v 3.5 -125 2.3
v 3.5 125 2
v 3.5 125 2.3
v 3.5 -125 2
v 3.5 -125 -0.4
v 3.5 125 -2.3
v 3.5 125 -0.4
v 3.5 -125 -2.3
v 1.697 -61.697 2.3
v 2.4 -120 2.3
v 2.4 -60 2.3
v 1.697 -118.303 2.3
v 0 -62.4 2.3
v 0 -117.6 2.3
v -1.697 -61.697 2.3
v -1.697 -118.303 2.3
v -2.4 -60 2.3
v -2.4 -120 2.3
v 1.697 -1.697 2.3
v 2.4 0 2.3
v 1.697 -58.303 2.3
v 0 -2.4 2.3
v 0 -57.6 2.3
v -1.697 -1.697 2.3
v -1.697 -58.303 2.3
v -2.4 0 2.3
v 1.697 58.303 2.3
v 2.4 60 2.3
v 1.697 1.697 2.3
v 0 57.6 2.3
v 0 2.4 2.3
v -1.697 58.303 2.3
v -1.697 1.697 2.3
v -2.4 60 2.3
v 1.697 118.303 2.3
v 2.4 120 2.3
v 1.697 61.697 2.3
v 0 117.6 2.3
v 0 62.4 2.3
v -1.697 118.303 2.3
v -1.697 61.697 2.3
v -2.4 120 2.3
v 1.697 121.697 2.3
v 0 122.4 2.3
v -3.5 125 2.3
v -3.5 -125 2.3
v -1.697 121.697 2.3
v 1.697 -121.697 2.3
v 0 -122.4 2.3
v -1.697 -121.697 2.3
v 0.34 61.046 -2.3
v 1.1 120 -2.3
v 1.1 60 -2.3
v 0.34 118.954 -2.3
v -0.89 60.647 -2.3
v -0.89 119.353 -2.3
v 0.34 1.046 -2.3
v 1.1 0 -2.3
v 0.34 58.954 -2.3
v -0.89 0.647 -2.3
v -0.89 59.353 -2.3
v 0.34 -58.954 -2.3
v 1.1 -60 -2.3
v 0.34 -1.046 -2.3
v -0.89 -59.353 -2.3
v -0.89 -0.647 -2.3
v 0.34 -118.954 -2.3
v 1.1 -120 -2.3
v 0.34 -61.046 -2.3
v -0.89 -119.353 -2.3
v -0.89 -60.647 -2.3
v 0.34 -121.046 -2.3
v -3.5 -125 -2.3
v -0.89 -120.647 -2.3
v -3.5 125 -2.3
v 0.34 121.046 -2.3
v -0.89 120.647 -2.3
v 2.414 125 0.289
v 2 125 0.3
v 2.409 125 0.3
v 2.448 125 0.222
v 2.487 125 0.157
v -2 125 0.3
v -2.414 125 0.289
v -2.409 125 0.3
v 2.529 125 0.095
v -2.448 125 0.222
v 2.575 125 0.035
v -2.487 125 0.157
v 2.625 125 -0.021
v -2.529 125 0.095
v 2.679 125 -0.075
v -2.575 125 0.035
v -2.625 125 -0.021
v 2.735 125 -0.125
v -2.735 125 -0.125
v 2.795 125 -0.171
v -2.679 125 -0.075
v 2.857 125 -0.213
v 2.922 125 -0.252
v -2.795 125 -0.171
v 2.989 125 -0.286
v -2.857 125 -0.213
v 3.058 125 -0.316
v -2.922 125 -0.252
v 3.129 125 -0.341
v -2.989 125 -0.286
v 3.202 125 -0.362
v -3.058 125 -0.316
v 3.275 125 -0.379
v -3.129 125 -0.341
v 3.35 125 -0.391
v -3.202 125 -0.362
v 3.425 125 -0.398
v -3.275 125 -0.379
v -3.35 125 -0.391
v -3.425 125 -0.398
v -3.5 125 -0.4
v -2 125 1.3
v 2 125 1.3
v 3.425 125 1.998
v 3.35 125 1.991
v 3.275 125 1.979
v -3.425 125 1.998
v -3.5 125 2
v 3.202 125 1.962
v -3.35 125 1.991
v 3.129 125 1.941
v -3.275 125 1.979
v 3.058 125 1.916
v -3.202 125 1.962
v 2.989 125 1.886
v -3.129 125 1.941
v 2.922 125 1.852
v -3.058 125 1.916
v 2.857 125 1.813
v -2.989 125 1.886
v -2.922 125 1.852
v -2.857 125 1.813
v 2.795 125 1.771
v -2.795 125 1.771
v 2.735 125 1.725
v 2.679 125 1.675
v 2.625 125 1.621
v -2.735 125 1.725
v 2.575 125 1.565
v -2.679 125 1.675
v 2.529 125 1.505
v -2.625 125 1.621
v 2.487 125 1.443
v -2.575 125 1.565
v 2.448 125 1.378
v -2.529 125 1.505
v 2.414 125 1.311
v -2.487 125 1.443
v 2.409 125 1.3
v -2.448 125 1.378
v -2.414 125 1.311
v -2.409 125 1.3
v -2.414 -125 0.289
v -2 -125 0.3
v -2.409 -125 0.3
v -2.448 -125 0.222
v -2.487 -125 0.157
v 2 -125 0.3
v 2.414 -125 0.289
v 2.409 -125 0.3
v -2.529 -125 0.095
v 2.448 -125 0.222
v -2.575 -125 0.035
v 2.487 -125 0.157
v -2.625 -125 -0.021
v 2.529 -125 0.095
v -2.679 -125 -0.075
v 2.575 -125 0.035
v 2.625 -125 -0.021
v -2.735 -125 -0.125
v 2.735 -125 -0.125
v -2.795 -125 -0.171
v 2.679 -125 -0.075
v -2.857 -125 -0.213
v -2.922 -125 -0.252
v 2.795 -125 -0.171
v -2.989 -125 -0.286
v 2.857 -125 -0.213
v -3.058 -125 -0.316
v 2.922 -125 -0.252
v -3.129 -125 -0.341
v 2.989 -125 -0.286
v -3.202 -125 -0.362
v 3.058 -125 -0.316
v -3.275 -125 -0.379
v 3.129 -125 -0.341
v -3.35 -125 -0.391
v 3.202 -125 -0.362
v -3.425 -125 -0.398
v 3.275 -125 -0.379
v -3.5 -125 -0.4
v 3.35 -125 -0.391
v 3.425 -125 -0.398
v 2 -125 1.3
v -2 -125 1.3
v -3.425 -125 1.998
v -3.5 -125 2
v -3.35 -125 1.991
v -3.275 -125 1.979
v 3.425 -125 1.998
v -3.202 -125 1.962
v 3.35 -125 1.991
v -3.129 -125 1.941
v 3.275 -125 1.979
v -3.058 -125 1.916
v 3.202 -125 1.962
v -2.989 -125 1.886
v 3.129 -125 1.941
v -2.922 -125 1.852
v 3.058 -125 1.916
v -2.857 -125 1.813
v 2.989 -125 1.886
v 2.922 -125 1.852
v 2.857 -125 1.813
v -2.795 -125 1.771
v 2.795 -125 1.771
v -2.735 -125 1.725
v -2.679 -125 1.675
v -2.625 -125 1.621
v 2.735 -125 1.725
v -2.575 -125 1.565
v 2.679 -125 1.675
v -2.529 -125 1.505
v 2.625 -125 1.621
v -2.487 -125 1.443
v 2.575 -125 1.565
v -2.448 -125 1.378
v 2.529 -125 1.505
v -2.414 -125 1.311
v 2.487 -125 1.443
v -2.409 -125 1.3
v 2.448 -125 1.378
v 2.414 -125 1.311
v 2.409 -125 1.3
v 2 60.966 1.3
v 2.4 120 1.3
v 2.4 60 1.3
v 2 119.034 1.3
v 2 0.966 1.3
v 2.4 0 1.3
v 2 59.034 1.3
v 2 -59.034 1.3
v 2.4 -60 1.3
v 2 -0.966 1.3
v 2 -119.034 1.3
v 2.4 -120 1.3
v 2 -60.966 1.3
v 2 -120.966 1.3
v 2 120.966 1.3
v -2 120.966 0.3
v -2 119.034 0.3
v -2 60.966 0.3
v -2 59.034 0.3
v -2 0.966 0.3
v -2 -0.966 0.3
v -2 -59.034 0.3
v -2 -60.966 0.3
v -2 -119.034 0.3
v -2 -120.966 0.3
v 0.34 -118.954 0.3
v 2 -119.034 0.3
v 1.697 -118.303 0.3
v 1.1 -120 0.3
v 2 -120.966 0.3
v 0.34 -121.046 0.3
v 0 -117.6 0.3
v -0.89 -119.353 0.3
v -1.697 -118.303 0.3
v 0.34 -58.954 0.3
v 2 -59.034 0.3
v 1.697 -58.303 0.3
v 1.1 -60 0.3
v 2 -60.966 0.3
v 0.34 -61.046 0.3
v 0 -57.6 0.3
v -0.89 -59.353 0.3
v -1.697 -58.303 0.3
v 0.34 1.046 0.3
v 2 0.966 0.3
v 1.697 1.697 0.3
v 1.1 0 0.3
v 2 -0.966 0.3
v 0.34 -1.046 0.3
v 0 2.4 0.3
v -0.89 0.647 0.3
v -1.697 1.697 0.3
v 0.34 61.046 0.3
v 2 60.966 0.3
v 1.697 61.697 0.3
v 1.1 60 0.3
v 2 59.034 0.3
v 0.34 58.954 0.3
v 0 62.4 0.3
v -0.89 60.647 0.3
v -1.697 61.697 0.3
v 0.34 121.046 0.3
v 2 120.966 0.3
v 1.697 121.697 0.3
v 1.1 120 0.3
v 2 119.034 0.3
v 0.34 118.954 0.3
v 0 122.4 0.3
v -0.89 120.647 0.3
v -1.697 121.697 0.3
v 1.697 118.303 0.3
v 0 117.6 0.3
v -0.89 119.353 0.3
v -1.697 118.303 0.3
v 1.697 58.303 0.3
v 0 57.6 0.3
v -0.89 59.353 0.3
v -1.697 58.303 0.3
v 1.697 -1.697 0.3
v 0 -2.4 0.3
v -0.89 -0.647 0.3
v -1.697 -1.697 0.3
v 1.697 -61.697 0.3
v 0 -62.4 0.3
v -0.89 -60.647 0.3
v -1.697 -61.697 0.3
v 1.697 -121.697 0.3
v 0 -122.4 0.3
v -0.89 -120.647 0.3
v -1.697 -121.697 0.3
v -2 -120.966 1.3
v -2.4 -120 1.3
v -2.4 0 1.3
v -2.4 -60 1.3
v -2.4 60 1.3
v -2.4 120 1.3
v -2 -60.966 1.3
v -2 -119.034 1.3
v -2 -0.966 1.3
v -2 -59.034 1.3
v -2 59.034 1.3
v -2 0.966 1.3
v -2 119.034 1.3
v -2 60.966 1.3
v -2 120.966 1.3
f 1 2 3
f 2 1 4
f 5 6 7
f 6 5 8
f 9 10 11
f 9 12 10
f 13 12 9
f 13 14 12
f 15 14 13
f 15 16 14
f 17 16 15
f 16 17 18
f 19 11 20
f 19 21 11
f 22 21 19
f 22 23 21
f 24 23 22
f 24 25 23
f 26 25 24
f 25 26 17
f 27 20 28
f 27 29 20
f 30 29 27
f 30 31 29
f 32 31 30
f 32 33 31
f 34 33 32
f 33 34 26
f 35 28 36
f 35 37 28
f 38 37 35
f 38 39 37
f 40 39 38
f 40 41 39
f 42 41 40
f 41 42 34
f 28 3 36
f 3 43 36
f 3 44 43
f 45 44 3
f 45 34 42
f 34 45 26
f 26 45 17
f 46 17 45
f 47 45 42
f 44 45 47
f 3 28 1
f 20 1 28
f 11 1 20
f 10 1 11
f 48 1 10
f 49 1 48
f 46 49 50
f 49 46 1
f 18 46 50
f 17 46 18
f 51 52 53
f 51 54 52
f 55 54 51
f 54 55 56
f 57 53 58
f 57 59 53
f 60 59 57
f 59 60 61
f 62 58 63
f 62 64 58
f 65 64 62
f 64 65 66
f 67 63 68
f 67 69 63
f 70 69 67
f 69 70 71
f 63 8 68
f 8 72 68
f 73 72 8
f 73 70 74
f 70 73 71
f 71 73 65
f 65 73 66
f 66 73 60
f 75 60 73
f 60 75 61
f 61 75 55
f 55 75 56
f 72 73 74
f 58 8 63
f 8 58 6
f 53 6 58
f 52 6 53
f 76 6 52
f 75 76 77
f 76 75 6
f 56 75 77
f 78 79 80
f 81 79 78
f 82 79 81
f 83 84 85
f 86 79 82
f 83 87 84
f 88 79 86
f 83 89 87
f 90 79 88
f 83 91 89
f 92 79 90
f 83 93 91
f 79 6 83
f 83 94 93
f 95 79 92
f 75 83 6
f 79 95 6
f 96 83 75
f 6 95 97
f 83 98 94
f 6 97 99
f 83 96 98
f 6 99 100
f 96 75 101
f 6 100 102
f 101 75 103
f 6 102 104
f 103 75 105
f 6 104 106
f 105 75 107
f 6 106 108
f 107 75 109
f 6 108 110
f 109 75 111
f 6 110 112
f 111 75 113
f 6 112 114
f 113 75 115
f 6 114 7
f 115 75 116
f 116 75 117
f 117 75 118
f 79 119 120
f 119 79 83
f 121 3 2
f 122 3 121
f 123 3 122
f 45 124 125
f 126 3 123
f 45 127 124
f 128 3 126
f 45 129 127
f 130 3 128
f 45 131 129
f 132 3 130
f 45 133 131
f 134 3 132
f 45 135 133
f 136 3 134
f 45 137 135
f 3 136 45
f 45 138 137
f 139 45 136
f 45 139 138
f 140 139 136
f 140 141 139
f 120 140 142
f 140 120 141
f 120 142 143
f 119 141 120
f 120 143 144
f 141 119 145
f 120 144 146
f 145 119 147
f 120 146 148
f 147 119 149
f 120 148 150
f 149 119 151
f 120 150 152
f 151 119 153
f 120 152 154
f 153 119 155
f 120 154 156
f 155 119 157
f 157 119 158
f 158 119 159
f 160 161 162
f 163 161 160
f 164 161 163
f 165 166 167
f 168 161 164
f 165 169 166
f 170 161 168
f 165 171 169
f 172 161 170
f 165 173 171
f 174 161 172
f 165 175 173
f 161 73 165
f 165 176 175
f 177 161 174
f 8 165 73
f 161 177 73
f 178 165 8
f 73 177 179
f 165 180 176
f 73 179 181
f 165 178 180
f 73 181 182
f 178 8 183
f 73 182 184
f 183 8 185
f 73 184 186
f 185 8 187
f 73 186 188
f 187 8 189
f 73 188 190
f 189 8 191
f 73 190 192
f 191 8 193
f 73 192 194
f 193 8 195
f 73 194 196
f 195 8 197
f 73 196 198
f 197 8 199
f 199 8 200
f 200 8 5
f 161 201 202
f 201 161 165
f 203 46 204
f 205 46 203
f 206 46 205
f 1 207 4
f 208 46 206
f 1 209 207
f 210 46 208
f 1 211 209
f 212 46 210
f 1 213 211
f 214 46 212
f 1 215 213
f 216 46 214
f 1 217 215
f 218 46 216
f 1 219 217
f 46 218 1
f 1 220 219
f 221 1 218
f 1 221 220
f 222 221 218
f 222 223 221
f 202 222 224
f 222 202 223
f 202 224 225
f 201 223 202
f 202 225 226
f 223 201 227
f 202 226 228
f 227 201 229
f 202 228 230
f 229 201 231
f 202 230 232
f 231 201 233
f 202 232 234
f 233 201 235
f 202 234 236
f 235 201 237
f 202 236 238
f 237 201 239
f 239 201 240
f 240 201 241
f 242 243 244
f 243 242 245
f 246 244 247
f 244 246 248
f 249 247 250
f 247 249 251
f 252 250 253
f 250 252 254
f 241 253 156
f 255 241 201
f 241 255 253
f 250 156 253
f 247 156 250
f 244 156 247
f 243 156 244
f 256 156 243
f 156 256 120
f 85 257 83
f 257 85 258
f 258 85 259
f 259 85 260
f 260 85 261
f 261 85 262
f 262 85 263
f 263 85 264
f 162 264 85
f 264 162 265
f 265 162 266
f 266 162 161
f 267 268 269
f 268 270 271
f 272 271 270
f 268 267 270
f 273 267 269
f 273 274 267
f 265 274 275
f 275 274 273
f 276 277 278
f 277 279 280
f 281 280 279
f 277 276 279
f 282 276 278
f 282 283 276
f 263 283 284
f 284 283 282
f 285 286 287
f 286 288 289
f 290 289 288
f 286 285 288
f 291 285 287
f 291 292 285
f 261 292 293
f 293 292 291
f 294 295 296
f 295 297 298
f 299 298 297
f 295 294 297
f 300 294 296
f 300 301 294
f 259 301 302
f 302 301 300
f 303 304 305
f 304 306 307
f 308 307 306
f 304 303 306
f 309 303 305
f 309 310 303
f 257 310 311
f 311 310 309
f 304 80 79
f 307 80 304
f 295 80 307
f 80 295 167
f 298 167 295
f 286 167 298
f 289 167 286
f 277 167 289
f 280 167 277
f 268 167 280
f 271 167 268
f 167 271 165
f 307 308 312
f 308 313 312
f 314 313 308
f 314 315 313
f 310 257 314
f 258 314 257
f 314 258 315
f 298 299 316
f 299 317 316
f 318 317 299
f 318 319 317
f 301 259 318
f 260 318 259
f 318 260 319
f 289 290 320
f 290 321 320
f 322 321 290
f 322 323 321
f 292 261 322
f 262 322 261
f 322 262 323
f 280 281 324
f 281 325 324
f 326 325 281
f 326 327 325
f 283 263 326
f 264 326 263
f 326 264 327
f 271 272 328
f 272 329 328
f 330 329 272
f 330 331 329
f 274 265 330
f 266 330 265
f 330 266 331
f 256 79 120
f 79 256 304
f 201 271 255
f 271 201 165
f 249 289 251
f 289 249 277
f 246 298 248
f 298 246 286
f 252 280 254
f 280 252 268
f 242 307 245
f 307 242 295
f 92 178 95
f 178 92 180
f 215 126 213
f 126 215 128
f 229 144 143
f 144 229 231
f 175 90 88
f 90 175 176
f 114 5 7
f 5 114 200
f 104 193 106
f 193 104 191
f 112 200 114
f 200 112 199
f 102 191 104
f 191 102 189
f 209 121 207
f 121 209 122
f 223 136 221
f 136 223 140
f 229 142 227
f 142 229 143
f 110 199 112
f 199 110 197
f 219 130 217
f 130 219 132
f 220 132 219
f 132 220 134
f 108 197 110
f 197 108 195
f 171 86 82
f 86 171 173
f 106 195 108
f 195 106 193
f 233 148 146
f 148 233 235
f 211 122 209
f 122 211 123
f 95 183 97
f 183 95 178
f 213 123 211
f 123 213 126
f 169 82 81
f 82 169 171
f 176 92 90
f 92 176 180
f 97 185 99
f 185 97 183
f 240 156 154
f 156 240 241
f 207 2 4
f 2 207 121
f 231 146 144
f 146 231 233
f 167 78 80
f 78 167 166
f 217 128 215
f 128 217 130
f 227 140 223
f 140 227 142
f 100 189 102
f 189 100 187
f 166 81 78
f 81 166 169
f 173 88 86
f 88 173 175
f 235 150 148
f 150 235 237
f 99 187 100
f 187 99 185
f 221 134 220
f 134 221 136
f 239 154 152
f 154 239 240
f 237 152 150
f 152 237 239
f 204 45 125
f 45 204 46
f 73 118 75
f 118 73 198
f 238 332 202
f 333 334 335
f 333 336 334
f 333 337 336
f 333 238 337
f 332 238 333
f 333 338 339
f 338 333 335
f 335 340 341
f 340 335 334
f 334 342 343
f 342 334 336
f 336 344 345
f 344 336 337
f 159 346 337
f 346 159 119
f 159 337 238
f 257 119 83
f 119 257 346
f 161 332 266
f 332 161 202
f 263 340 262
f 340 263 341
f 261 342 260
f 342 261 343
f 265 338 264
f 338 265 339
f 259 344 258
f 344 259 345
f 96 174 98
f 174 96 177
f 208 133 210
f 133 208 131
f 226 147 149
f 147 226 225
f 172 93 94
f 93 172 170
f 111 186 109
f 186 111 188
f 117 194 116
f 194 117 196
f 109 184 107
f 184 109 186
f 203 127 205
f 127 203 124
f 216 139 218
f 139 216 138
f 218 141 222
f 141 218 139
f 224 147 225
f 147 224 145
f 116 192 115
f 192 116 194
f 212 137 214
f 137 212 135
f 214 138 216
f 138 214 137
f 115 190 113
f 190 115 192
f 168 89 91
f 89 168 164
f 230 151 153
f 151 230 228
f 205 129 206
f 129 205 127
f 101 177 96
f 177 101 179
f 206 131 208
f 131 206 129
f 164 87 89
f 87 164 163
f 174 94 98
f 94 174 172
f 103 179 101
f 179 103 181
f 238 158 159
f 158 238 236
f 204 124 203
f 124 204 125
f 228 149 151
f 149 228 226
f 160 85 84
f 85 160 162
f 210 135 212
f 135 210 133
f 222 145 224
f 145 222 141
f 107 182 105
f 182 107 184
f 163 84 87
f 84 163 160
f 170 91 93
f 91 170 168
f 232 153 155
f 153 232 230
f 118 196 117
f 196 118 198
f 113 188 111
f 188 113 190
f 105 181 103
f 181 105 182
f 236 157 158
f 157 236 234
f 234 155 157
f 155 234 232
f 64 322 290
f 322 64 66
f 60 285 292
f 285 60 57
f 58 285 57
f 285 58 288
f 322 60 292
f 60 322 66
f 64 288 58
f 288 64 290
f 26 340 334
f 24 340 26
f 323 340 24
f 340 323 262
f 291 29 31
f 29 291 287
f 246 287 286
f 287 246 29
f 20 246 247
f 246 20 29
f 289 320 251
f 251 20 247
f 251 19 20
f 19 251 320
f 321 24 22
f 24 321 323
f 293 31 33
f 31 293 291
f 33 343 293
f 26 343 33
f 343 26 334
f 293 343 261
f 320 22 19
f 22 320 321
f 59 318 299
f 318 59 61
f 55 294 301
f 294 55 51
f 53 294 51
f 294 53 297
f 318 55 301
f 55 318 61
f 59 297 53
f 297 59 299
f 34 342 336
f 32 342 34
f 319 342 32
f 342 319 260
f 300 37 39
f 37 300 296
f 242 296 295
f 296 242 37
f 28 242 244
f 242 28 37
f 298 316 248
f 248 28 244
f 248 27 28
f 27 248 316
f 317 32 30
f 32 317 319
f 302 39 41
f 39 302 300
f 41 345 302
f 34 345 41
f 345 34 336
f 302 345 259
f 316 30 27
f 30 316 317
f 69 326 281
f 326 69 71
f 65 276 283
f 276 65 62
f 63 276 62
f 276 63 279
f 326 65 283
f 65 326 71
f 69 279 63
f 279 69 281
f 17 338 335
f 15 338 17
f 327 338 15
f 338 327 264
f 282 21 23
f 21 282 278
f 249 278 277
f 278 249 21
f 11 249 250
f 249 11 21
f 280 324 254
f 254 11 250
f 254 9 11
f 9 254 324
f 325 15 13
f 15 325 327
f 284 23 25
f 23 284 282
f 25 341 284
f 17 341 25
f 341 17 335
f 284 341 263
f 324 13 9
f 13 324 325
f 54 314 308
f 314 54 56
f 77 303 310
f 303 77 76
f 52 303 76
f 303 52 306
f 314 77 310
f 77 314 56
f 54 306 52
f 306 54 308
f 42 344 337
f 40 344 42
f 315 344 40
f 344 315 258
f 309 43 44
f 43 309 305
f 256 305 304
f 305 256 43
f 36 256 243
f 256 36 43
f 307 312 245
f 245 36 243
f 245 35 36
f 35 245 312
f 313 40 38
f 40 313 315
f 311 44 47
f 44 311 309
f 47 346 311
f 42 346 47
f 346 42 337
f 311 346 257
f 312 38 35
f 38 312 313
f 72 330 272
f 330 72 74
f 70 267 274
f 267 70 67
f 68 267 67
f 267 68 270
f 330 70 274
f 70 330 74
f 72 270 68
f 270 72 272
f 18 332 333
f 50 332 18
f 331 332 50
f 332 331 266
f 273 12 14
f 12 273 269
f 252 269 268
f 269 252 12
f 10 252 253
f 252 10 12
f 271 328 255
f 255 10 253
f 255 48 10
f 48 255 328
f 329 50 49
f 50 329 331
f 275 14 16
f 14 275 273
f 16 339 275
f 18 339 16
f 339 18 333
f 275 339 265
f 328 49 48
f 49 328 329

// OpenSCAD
/*
Common Guide Measurements, rrecently learnt about the scope variable, sad face.

All measurements in metric millimetres
*/

//If anyone knows of a guide to standardisation among sizings of linear guides and there carriages let me know so I can make this more accurate and add more options, would like to have the carriage generation as well eventually.

//Default Style (For custom measurements choose custom)
//type = "MGN7"; // [MGN12, MGN7, custom]


//Linear Rail Length
guideLength = 250;

//Guide Height
guideWidth = 7;

//Guide Height
guideHeight = 4.6;

//Ball Guide distance from top of the carriage
ballGuideTopDistance = 1.5;

//(spacing between holes not pitch)
holePitch = 60;

//Inner Hole Radius 
innerHoleDiameter = 1.1;

//Outer Hole Radius
outerHoleDiameter = 2.4;

//Depth of the top outer hole to the inner.
outerHoleDepth = 2;
 

module guideRail(){
    //Draw profile cube of width, length and height, cut cylinder and cube out for rollers then mirror on the x-axis.
        difference(){
            difference (){
                translate([guideWidth/4,0,0])
                cube([guideWidth/2, guideLength, guideHeight], true);
                    translate([guideWidth/2-1,0,guideHeight/2-ballGuideTopDistance])    cube([1,guideLength+1,1], true);
            };
            rotate(a = 90, v = [1,0,0]){
                translate([guideWidth/2,guideHeight/2-ballGuideTopDistance,0]){
                    cylinder(guideLength+2, 1.2, 1.2, $fn=100 ,true);
                }
            }
        };
    //mirror opposite side
    mirror([1,0,0]){
        difference(){
            difference (){
                translate([guideWidth/4,0,0])
                cube([guideWidth/2, guideLength, guideHeight], true);
                    translate([guideWidth/2-1,0,guideHeight/2-ballGuideTopDistance])    cube([1,guideLength+1,1], true);
            };
            rotate(a = 90, v = [1,0,0]){
                translate([guideWidth/2,guideHeight/2-ballGuideTopDistance,0]){
                    cylinder(guideLength+2, 1.2, 1.2, $fn=100 ,true);
                }
            }
        };
    }
}

module guideHoles(){
    

        for(a = [0:floor((guideLength/holePitch)/2)]){
            
            translate([0,(holePitch)*a,0]){
                union(){
                    cylinder(guideHeight+4, innerHoleDiameter,innerHoleDiameter, true);
                    translate([0,0,guideHeight-outerHoleDepth]){
                    cylinder(guideHeight, outerHoleDiameter, outerHoleDiameter, true);}
                }
            }
                        translate([0,-1*(holePitch)*a,0]){
                union(){
                    cylinder(guideHeight+4, innerHoleDiameter,innerHoleDiameter, true);
                    translate([0,0,guideHeight-outerHoleDepth]){
                    cylinder(guideHeight, outerHoleDiameter, outerHoleDiameter, true);}
                }
            }
        }
    }
    





difference(){
    guideRail();
    guideHoles();
}
